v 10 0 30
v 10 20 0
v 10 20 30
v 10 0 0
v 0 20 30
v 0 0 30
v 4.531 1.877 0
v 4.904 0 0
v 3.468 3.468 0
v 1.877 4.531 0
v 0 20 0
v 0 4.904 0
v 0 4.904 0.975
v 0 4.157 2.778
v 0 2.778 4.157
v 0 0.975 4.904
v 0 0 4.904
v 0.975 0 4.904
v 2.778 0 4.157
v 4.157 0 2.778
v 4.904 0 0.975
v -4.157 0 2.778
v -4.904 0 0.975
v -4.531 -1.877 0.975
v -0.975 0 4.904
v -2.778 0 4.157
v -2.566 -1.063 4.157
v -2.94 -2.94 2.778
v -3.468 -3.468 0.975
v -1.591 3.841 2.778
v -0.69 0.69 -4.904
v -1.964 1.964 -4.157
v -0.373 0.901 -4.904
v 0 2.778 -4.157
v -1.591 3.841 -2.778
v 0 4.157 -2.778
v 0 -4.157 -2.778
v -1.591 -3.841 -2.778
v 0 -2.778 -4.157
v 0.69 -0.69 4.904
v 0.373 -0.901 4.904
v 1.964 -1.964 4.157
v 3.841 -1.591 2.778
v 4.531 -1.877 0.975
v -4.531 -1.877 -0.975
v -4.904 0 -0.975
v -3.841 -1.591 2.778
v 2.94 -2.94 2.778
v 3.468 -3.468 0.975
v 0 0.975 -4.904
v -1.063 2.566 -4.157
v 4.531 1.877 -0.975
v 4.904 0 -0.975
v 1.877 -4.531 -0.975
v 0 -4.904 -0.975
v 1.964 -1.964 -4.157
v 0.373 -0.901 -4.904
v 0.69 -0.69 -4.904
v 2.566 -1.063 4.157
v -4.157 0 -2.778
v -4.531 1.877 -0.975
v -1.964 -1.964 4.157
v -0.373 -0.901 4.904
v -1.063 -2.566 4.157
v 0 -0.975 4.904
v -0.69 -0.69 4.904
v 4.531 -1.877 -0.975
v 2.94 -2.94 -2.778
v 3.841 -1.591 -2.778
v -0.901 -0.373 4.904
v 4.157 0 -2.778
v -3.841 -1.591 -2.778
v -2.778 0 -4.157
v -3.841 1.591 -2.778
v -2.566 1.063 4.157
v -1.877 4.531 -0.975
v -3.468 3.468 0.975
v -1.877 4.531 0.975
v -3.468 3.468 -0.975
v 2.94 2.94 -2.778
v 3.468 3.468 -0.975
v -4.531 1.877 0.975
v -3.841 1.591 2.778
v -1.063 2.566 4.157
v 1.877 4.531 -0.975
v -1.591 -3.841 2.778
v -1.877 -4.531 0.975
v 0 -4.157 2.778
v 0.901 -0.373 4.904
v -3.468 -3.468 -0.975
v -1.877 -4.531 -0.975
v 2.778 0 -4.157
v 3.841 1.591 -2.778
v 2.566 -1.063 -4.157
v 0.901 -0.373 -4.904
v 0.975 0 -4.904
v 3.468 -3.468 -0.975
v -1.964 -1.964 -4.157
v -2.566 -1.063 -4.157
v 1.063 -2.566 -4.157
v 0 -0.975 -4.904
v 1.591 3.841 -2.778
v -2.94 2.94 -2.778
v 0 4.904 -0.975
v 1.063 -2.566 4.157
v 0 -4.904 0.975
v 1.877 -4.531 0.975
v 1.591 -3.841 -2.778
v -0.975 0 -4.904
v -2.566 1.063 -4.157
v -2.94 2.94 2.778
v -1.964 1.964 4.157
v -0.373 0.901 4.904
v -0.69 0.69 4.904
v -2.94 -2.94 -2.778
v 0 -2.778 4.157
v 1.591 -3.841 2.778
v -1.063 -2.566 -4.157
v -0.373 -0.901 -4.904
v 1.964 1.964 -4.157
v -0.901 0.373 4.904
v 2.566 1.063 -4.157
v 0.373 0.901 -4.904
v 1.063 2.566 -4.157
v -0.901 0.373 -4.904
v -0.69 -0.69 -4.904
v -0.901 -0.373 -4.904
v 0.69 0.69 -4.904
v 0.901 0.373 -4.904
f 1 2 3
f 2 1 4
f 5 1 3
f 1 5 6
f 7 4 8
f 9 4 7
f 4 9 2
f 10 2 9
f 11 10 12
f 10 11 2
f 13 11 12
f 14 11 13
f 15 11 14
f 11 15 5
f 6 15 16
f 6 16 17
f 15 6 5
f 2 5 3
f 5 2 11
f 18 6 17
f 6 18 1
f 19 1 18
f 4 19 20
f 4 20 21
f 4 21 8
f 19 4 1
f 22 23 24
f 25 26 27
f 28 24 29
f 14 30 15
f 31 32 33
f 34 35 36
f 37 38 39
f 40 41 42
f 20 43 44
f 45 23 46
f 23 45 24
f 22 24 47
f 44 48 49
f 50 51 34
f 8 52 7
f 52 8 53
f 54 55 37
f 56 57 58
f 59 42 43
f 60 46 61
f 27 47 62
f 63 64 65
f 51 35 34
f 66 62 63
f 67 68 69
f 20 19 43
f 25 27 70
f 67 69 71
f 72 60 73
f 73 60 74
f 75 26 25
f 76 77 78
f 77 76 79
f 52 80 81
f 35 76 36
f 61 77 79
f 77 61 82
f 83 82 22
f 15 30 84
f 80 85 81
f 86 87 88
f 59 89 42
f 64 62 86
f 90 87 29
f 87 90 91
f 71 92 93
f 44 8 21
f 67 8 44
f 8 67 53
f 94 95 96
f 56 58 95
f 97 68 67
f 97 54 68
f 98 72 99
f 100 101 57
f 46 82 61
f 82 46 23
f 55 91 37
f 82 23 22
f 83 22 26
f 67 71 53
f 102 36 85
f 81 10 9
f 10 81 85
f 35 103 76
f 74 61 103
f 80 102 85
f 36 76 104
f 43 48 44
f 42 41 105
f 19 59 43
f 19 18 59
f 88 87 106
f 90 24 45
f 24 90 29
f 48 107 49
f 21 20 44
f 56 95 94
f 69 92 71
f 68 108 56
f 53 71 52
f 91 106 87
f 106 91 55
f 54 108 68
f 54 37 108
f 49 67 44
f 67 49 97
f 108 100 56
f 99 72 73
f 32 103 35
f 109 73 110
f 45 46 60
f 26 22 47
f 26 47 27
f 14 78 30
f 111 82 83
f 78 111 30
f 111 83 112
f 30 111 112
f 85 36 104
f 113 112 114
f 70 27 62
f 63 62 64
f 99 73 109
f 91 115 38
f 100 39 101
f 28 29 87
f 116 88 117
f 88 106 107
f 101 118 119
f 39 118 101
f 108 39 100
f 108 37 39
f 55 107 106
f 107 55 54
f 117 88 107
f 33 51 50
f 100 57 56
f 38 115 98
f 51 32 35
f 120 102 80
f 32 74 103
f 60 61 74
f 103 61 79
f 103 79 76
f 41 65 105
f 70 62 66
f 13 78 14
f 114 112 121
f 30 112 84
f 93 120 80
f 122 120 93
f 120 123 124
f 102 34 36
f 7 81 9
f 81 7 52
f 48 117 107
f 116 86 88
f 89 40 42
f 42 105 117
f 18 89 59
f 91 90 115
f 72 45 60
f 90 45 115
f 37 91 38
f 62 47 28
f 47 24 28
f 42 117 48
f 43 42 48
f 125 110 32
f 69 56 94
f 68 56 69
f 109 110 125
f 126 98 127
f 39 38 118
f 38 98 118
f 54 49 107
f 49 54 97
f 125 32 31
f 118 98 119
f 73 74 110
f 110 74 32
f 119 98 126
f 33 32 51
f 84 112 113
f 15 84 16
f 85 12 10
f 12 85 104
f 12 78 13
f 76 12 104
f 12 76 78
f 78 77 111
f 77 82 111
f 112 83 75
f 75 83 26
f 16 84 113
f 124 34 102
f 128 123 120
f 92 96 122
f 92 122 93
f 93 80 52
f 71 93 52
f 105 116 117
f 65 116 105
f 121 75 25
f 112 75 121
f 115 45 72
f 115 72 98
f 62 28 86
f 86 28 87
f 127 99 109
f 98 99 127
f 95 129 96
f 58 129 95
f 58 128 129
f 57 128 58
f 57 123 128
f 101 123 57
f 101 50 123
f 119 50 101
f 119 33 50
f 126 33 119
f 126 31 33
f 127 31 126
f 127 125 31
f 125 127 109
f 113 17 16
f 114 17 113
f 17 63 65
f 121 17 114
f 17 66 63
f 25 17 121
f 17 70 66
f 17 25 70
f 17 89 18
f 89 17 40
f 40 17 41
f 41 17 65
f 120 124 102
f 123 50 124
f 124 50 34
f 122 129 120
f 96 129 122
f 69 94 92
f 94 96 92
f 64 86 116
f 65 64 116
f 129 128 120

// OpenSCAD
// Simple test file for OpenSCAD grammar
cube([10, 20, 30]);

module test_module() {
    sphere(r=5);
}

test_module();
